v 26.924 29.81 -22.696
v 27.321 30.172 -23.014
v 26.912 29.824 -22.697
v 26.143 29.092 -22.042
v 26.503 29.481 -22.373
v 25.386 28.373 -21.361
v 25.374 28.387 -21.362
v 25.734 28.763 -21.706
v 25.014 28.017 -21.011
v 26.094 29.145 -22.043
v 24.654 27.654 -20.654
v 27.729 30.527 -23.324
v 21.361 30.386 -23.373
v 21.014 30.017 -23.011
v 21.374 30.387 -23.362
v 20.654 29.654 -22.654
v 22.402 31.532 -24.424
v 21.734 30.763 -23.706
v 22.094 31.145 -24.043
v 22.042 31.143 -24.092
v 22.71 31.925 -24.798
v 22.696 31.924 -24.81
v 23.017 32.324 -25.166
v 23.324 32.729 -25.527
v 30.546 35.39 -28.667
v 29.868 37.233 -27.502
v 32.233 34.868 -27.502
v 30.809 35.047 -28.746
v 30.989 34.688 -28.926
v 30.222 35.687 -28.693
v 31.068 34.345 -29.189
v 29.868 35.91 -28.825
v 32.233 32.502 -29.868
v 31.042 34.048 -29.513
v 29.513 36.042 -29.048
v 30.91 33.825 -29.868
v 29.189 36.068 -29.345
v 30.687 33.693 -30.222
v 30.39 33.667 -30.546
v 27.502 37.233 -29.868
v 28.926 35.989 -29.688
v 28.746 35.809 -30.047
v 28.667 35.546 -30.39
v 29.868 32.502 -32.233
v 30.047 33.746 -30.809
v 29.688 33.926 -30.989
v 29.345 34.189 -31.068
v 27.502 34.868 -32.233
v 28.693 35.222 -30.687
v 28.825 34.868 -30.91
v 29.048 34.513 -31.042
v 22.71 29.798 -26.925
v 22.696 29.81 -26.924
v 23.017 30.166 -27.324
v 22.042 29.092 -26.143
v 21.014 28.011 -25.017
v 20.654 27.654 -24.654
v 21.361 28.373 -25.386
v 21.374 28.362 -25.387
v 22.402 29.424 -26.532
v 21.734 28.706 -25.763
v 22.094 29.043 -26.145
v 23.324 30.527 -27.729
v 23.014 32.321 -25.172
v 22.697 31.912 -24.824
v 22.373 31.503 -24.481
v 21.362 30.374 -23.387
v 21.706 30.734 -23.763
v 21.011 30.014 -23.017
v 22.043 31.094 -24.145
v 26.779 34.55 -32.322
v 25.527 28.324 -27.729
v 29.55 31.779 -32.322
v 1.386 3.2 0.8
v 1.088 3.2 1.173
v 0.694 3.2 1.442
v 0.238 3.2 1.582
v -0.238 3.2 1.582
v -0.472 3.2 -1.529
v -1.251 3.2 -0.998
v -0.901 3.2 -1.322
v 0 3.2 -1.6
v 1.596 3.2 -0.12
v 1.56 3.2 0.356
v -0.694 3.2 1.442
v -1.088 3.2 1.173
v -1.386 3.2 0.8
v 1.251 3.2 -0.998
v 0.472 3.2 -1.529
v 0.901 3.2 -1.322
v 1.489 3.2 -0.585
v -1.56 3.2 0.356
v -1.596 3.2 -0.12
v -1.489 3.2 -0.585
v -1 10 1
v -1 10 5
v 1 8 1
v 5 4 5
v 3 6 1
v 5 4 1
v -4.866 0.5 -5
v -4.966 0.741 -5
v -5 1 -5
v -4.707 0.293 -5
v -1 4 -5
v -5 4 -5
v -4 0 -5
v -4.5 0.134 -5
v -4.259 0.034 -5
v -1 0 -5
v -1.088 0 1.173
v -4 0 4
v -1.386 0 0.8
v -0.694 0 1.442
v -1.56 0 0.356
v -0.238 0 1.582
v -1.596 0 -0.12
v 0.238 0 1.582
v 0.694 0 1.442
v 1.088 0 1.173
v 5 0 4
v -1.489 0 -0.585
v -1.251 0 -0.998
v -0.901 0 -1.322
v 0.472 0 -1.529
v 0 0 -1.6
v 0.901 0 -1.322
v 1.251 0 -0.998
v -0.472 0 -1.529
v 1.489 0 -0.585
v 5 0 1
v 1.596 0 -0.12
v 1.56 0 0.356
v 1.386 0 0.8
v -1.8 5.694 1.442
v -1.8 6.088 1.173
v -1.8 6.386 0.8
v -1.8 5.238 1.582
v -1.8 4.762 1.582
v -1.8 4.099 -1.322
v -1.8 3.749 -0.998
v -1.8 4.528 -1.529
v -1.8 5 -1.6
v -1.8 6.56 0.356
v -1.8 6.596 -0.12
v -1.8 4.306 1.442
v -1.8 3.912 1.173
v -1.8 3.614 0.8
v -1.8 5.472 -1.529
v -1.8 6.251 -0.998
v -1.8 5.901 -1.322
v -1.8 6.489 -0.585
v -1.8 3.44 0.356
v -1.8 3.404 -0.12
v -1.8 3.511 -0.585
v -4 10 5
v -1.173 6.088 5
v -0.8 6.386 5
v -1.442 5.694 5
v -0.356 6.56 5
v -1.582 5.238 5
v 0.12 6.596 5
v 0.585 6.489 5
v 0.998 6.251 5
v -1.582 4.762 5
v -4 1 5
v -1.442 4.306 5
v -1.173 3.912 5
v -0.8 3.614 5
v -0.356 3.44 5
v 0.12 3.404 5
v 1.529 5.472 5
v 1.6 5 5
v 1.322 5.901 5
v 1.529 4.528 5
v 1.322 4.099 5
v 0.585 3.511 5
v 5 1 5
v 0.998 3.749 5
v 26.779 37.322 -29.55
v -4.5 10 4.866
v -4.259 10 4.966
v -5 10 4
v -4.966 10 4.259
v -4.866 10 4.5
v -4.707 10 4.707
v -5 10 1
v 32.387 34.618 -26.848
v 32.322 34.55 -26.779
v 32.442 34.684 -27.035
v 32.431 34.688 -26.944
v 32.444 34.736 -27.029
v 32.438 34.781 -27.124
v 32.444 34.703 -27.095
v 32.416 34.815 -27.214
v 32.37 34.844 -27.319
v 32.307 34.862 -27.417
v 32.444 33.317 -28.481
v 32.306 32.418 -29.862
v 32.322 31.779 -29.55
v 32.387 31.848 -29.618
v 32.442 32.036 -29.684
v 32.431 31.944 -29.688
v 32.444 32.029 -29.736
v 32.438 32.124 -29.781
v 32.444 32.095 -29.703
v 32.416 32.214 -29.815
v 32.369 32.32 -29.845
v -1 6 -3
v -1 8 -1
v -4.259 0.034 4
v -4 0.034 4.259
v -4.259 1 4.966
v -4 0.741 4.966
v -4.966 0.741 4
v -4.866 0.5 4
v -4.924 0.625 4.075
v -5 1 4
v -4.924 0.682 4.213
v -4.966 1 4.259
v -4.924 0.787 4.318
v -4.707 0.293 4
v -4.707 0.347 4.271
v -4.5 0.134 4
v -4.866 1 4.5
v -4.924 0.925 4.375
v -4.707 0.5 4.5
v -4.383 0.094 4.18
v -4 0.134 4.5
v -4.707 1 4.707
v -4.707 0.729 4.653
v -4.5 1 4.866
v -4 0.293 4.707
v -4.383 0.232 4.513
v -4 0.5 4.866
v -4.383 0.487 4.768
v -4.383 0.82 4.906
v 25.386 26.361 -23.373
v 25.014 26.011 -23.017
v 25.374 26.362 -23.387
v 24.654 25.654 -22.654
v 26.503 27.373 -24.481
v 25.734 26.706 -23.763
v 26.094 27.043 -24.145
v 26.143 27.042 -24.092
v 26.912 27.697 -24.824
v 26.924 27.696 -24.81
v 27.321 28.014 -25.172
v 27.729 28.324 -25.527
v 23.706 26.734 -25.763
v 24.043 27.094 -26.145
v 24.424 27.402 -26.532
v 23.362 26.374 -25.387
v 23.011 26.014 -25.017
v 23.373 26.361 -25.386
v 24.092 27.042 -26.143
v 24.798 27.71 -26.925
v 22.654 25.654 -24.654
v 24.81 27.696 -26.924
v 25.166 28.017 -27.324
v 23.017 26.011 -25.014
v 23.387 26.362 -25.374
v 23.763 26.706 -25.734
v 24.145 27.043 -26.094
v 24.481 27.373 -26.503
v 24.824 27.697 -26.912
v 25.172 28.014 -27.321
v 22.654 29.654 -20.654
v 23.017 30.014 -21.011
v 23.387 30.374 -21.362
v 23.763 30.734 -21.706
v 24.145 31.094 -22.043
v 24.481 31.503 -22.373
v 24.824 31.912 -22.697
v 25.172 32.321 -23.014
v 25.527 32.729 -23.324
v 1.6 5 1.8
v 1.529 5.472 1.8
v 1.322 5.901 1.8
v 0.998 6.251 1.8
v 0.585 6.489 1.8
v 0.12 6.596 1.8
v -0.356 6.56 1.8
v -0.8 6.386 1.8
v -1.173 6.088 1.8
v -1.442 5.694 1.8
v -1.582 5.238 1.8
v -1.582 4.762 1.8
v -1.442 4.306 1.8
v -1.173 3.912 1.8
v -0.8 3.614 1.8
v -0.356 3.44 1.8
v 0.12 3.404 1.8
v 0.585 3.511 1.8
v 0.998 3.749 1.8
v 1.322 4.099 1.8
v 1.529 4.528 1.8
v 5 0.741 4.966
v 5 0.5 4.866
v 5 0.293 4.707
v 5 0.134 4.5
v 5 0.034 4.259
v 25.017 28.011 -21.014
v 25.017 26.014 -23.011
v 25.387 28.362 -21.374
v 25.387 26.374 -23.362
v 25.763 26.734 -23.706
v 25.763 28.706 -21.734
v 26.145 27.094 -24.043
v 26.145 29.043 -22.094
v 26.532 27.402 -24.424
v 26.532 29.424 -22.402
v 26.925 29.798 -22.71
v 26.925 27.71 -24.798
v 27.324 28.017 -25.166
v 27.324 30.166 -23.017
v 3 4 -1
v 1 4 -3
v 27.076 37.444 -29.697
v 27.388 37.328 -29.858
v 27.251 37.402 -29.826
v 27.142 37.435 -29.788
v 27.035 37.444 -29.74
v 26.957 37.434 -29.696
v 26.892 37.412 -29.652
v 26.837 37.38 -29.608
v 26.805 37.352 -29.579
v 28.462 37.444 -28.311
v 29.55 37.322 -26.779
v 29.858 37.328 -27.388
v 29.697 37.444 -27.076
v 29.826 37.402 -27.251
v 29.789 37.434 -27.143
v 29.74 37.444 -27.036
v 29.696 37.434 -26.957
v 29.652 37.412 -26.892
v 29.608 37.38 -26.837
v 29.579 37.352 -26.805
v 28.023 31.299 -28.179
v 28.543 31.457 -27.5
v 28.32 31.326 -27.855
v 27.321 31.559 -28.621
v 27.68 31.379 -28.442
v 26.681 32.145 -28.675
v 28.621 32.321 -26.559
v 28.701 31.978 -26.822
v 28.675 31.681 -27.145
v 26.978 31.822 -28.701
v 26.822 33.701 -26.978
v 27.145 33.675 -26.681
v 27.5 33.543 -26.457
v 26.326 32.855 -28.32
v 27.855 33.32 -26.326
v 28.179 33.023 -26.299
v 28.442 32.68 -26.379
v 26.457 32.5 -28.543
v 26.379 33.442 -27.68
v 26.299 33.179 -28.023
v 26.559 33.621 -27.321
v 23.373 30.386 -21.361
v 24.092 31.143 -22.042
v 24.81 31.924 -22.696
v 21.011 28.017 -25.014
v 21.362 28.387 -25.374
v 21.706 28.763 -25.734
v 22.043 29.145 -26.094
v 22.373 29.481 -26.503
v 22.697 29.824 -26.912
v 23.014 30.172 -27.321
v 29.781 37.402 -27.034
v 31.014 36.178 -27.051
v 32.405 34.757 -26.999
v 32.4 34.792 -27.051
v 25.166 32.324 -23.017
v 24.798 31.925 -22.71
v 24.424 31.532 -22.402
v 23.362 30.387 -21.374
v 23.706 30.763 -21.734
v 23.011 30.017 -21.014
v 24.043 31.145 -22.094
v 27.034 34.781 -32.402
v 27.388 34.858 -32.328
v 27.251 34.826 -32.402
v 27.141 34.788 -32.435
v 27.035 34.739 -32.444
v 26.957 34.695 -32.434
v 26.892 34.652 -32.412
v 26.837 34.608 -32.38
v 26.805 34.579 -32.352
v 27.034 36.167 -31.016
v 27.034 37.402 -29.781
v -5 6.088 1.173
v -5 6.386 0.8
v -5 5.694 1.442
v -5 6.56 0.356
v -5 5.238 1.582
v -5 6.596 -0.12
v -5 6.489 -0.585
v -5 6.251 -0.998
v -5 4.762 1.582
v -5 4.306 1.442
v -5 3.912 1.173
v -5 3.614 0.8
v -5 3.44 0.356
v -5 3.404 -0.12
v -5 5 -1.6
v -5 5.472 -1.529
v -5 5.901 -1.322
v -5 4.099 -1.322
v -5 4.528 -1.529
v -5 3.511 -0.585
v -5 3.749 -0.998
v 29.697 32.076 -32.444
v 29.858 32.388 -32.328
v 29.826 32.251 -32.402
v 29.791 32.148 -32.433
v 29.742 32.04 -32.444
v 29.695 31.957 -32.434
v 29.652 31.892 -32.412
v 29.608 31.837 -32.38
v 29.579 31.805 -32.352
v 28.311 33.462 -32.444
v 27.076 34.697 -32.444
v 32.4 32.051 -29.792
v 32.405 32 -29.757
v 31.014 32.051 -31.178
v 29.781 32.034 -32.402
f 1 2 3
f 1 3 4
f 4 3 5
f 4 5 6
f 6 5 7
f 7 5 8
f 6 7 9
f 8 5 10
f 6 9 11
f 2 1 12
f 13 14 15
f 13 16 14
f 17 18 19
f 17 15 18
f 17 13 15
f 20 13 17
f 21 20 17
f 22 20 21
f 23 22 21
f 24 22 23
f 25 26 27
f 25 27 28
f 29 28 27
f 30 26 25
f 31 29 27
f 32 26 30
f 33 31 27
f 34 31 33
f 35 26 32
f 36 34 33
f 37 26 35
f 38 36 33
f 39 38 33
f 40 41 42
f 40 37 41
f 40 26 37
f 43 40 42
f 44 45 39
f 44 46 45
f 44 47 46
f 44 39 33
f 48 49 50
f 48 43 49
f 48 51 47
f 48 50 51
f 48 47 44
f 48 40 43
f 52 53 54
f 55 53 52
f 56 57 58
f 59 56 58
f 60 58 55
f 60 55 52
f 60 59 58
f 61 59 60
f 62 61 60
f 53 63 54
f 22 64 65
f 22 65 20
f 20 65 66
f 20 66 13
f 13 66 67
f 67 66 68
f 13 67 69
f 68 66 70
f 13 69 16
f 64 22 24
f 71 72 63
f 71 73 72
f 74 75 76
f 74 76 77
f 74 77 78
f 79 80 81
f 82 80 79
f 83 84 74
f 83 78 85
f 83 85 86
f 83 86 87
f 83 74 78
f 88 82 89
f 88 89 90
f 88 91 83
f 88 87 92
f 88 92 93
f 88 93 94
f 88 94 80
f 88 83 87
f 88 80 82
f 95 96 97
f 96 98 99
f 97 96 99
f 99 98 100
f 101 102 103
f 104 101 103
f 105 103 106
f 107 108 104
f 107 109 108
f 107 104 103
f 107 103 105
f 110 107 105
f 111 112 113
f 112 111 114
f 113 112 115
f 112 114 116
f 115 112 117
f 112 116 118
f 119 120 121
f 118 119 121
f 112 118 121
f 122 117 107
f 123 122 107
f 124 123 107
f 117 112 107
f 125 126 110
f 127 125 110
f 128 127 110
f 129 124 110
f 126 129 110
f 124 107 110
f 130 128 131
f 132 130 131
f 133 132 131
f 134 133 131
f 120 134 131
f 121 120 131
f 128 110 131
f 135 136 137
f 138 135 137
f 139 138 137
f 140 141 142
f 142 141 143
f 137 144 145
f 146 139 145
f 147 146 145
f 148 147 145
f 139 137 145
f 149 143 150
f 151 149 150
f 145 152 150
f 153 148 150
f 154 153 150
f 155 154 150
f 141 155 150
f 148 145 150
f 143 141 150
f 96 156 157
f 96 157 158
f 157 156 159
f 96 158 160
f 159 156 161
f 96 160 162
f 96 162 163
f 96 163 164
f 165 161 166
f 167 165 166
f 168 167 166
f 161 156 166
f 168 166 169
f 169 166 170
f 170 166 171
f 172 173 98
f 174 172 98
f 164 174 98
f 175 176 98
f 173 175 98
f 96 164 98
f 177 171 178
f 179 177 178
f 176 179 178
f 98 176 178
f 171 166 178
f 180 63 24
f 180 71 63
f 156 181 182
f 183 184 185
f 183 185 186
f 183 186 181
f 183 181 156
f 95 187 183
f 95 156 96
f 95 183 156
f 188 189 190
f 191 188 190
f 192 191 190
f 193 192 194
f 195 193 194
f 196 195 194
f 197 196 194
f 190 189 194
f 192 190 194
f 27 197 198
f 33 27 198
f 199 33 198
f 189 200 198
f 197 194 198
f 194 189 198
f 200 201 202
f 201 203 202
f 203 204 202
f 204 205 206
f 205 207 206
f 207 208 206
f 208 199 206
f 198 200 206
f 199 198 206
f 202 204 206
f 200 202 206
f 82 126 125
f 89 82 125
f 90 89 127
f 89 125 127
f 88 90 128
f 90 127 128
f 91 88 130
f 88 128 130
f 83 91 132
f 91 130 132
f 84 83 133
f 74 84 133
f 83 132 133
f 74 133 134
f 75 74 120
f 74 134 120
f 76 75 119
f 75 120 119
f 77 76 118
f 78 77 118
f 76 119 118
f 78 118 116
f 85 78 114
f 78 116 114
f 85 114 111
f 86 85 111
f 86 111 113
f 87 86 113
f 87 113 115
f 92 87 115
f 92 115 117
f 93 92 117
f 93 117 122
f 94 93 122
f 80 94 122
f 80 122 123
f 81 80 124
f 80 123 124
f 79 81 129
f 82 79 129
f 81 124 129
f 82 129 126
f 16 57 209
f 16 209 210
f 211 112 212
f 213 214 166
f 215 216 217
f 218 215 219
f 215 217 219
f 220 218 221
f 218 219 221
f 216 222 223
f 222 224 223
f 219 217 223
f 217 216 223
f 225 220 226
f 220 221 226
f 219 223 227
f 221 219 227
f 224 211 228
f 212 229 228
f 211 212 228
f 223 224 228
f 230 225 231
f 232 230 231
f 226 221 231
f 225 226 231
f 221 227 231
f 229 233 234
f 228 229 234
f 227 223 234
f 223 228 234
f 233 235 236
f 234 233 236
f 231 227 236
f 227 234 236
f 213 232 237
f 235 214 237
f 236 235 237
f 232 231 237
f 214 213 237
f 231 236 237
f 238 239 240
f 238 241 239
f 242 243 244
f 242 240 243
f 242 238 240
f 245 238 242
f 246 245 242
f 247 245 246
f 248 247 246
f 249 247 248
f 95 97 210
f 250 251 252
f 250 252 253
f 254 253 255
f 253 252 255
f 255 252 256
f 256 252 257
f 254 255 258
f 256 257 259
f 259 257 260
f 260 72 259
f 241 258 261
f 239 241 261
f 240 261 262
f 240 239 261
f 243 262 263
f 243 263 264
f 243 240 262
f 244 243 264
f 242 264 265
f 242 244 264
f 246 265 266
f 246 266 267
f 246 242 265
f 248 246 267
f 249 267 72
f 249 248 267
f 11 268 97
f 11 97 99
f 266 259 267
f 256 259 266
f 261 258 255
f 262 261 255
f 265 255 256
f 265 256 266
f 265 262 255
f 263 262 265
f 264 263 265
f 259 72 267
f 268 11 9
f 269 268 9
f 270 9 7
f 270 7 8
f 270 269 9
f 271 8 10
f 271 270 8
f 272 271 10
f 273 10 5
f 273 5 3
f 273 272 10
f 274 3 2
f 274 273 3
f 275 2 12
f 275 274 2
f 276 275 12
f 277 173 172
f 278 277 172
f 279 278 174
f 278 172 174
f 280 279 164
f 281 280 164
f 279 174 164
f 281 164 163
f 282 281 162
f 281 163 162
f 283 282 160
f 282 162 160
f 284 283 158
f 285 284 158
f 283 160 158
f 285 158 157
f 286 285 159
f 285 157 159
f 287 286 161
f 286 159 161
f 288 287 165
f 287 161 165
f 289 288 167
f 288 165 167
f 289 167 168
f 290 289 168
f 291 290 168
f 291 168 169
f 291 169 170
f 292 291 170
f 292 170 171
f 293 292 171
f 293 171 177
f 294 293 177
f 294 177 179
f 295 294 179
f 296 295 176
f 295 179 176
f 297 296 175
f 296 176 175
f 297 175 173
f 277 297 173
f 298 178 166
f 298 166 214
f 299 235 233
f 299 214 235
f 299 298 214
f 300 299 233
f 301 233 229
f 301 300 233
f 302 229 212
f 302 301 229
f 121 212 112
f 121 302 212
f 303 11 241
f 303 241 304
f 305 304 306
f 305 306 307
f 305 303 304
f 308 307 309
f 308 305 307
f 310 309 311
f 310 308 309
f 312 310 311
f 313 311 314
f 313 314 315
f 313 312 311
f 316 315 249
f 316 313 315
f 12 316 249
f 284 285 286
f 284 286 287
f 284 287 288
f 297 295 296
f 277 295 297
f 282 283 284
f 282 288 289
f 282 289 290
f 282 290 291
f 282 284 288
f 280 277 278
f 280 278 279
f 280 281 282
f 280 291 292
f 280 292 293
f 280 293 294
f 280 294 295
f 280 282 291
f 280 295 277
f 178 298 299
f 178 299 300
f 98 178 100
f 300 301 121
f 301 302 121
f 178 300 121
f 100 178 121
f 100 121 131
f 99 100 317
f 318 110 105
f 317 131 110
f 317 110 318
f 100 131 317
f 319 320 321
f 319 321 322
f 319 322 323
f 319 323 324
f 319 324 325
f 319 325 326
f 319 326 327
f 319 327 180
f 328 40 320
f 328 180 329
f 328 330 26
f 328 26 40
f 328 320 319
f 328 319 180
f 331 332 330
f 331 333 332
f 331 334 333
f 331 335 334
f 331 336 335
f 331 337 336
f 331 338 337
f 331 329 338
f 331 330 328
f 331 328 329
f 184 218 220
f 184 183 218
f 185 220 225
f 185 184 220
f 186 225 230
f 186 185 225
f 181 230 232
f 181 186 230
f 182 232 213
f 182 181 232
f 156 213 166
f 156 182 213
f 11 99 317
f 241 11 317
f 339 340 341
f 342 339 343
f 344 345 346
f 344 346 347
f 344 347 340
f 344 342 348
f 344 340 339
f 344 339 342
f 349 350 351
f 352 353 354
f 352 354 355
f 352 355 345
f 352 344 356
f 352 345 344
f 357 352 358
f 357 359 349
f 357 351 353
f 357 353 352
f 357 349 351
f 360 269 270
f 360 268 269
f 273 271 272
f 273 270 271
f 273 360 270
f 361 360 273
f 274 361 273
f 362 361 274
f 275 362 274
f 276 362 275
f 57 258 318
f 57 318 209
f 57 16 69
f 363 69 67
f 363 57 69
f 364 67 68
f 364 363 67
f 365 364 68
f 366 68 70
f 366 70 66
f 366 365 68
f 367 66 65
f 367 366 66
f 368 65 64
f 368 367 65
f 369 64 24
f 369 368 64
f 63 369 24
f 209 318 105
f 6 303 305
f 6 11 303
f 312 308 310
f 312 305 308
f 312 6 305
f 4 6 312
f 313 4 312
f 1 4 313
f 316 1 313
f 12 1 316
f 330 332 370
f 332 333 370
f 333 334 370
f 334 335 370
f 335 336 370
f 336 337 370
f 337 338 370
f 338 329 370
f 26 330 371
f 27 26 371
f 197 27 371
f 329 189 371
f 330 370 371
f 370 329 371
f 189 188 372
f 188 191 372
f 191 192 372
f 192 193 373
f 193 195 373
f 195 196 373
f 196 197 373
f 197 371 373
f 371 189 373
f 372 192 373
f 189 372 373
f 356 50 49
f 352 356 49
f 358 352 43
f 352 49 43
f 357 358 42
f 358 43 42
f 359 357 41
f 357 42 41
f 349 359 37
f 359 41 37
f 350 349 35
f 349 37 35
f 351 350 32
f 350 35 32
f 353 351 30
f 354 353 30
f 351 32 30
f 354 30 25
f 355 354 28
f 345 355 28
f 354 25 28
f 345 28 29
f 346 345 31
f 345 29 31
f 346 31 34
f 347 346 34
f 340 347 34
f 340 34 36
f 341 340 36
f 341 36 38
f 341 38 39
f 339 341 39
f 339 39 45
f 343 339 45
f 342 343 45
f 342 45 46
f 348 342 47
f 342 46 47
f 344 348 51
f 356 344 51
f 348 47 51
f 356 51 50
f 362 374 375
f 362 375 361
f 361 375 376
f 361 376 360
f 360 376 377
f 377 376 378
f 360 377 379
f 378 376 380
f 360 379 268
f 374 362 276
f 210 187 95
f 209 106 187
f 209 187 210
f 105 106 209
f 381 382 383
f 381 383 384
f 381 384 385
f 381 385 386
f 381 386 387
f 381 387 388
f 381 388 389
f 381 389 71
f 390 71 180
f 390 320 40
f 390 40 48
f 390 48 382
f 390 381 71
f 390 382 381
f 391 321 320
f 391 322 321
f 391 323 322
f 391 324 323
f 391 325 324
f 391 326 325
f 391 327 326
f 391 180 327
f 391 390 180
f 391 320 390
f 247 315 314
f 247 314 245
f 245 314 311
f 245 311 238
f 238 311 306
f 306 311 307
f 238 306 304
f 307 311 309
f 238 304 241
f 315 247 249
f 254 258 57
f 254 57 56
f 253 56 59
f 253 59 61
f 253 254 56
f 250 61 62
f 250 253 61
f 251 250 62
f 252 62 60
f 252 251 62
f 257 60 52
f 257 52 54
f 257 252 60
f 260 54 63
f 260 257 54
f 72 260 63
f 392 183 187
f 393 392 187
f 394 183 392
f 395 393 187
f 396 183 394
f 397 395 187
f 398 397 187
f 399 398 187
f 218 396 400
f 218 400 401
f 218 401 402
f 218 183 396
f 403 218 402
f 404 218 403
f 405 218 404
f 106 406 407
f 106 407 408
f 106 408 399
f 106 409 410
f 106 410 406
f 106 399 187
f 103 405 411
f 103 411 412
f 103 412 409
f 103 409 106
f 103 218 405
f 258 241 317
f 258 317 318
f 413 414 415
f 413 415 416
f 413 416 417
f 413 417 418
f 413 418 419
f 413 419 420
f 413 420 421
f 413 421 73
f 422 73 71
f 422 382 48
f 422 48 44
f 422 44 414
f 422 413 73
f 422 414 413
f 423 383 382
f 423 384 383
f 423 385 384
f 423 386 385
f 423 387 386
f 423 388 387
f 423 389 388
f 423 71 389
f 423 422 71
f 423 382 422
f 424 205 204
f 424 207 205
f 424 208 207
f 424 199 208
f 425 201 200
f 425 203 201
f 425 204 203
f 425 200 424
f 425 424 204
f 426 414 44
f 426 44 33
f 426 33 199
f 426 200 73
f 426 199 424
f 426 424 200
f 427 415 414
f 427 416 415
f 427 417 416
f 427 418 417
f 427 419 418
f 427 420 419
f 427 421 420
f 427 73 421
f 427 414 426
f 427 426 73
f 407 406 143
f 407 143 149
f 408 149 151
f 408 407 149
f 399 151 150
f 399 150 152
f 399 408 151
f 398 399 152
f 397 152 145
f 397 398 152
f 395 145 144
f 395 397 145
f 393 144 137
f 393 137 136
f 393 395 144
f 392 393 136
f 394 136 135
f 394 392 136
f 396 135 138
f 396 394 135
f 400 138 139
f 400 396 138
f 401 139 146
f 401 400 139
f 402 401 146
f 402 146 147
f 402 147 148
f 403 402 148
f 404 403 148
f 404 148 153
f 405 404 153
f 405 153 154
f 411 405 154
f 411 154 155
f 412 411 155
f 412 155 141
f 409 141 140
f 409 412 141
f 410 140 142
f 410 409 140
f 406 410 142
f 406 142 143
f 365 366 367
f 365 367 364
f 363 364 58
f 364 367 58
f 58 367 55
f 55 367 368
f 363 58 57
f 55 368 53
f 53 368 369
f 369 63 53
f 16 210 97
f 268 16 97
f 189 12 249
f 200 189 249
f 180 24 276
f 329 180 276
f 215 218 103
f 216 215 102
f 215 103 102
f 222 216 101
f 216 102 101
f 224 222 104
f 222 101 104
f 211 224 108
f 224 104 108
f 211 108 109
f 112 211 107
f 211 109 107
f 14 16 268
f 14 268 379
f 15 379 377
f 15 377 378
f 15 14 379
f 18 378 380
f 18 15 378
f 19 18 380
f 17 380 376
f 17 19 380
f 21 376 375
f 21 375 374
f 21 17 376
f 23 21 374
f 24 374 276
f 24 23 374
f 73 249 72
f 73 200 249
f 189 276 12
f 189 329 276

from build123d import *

# Parameters (mm, degrees)
SKETCH1_W           = 10
SKETCH1_H           = 10
BOSS_EXTRUDE1_DEPTH = 10
SKETCH2_R           = 1.6
CUT_EXTRUDE1_DEPTH  = 3.2
SKETCH3_R           = 1.6
CUT_EXTRUDE3_DEPTH  = 3.2
SKETCH4_R           = 1.6
CUT_EXTRUDE4_DEPTH  = 3.2
FILLET2_R           = 1
CHAMFER1_SIZE       = 6
BOSS_EXTRUDE2_DEPTH = 50
SKETCH6_R           = 1.475
CUT_EXTRUDE5_DEPTH  = 4.1
FILLET3_R           = 0.5
FILLET4_R           = 50


with BuildPart() as part:
    # Sketch1 → Boss-Extrude1 (new body)
    with BuildSketch(Plane(origin=(0, 0, 0), x_dir=(1, 0, 0), z_dir=(0, 1, 0))):
        Rectangle(SKETCH1_W, SKETCH1_H)
    extrude(amount=BOSS_EXTRUDE1_DEPTH)

    # Sketch2 → Cut-Extrude1 (cut)
    with BuildSketch(Plane.XY.offset(5)):
        with Locations((0, 5)):
            Circle(SKETCH2_R)
    extrude(amount=-CUT_EXTRUDE1_DEPTH, mode=Mode.SUBTRACT)

    # Sketch3 → Cut-Extrude3 (cut)
    with BuildSketch(Plane(origin=(0, 0, 0), x_dir=(-1, 0, 0), z_dir=(0, -1, 0))):
        with Locations(Location((0, 0, 0), (0, 0, 90))):
            Circle(SKETCH3_R)
    extrude(amount=-CUT_EXTRUDE3_DEPTH, mode=Mode.SUBTRACT)

    # Sketch4 → Cut-Extrude4 (cut)
    with BuildSketch(Plane(origin=(-5, 0, 0), x_dir=(0, 0, -1), z_dir=(1, 0, 0))):
        with Locations((0, 5)):
            Circle(SKETCH4_R)
    extrude(amount=CUT_EXTRUDE4_DEPTH, mode=Mode.SUBTRACT)

    # Fillet2
    fillet2_edges = [part.edges().sort_by_distance(p)[0] for p in [
        (0, 0, 5),
        (-5, 0, 0),
        (-5, 5, 5),
    ]]
    fillet(fillet2_edges, radius=FILLET2_R)

    # Chamfer1
    chamfer1_edges = [part.edges().sort_by_distance(p)[0] for p in [
        (5, 10, 0),
        (5, 5, -5),
        (0, 10, -5),
    ]]
    chamfer(chamfer1_edges, length=CHAMFER1_SIZE)

    # Sketch5 → Boss-Extrude2 (add)
    with BuildSketch(Plane(origin=(2.666666667, 2.666666667, -2.666666667), x_dir=(-0.4082482904638649, -0.4082482904638639, -0.8164965809277248), z_dir=(0.5773502691896257, 0.577350269189624, -0.5773502691896276))):
        Polygon((0.40824829, 4.949747468), (-2.041241452, 6.363961031), (-4.490731195, 4.949747468), (-4.490731195, 2.121320344), (-2.041241452, 0.707106781), (0.40824829, 2.121320344), align=None)
    extrude(amount=BOSS_EXTRUDE2_DEPTH)

    # Sketch13 → Loft3 section 0
    with BuildSketch(Plane(origin=(25.760677434, 25.760677434, -25.760677434), x_dir=(-0.8164965809277259, 0.4082482904638619, -0.4082482904638644), z_dir=(0.577350269189626, 0.577350269189624, -0.5773502691896274))):
        with BuildLine():
            Line((2.041241452, 6.363961031), (-0.40824829, 4.949747468))
            Line((-0.40824829, 4.949747468), (-0.40824829, 2.121320344))
            Line((-0.40824829, 2.121320344), (2.041241452, 0.707106781))
            Line((2.041241452, 0.707106781), (4.490731195, 2.121320344))
            Line((4.490731195, 2.121320344), (4.490731195, 4.949747468))
            Line((4.490731195, 4.949747468), (2.041241452, 6.363961031))
        make_face()
    # Sketch12 → Loft3 section 1
    with BuildSketch(Plane(origin=(31.534180126, 31.534180126, -31.534180126), x_dir=(-0.40824829046386485, -0.4082482904638636, -0.8164965809277249), z_dir=(0.577350269189626, 0.5773502691896241, -0.5773502691896275))):
        with BuildLine():
            Line((1.40824829, 1.543970074), (1.40824829, 5.527097737))
            Line((1.40824829, 5.527097737), (-2.041241452, 7.518661569))
            Line((-2.041241452, 7.518661569), (-5.490731195, 5.527097737))
            Line((-5.490731195, 5.527097737), (-5.490731195, 1.543970074))
            Line((-5.490731195, 1.543970074), (-2.041241452, -0.447593757))
            Line((-2.041241452, -0.447593757), (1.40824829, 1.543970074))
        make_face()
    loft()

    # Sketch6 → Cut-Extrude5 (cut)
    with BuildSketch(Plane(origin=(31.534180126, 31.534180126, -31.534180126), x_dir=(-0.40824829046386507, -0.4082482904638639, -0.8164965809277246), z_dir=(0.5773502691896257, 0.5773502691896238, -0.5773502691896278))):
        with Locations(Location((-2.041241452, 3.535533906, 0), (0, 0, 30))):
            Circle(SKETCH6_R)
    extrude(amount=-CUT_EXTRUDE5_DEPTH, mode=Mode.SUBTRACT)

    # Fillet3
    fillet3_edges = [part.edges().sort_by_distance(p)[0] for p in [
        (28.459265169, 37.68401004, -28.459265169),
        (31.27576175, 36.27576175, -27.051016879),
        (32.68401004, 33.459265169, -28.459265169),
        (31.27576175, 32.051016879, -31.27576175),
        (28.459265169, 33.459265169, -32.68401004),
        (27.051016879, 36.27576175, -31.27576175),
    ]]
    fillet(fillet3_edges, radius=FILLET3_R)

    # Fillet4
    # the kernel refuses this fillet: 50 mm, written as the material it adds along each edge
    with BuildSketch(Plane(origin=(30.502434506, 27.094010768, -19.685587029), x_dir=(0.6151072128065446, 0.49324054325118827, -0.6151072128065457), z_dir=(-0.7071067811865475, -1.8318679906315083e-15, -0.7071067811865477))) as fillet4_piece_1_section:
        with BuildLine():
            CenterArc((FILLET4_R * 0.0498756211209, FILLET4_R), FILLET4_R, 264.289406863, 5.710593137)
            Line((-FILLET4_R * 0.0496280979001, FILLET4_R * 0.00496280979001), (0, 0))
            Line((0, 0), (FILLET4_R * 0.0498756211209, 0))
        make_face()
    fillet4_piece_1 = extrude(amount=15.297332405, mode=Mode.PRIVATE)
    fillet4_piece_1 = fillet4_piece_1 - Plane(origin=(5.44602295, 2.037599211, -65.47905465), x_dir=(0.4636707308133369, 0.463670730813339, 0.7549959647402431), z_dir=(0.7071067811865475, -0.7071067811865478, 2.220446049250313e-15)) * Cylinder(50, 41, mode=Mode.PRIVATE)
    fillet4_piece_1 = fillet4_piece_1 - Plane(origin=(65.47905465, 7.44602295, -0.037599211), x_dir=(-0.7549959647402456, 0.4636707308133344, -0.46367073081333715), z_dir=(0, 0.7071067811865497, 0.7071067811865455)) * Cylinder(50, 41, mode=Mode.PRIVATE)
    add(fillet4_piece_1)
    with BuildSketch(Plane(origin=(26.094010768, 33.502434506, -17.685587029), x_dir=(0.6557294359916664, 0.5338627664363041, -0.5338627664363074), z_dir=(0, -0.7071067811865497, -0.7071067811865455))) as fillet4_piece_2_section:
        with BuildLine():
            CenterArc((FILLET4_R * 0.0498756211209, FILLET4_R), FILLET4_R, 264.289406863, 5.710593137)
            Line((-FILLET4_R * 0.0496280979001, FILLET4_R * 0.00496280979001), (0, 0))
            Line((0, 0), (FILLET4_R * 0.0498756211209, 0))
        make_face()
    fillet4_piece_2 = extrude(amount=15.297332405, mode=Mode.PRIVATE)
    fillet4_piece_2 = fillet4_piece_2 - Plane(origin=(42.862428257, 50.270851996, 20.170603443), x_dir=(-0.3487737328890522, -0.34877373288905417, -0.8698929626645284), z_dir=(-0.7071067811865471, 0.7071067811865479, -1.8596235662471372e-15)) * Cylinder(50, 41, mode=Mode.PRIVATE)
    fillet4_piece_2 = fillet4_piece_2 - Plane(origin=(48.270851996, -15.170603443, -39.862428257), x_dir=(-0.34877373288905117, 0.8698929626645311, 0.3487737328890489), z_dir=(0.7071067811865476, 1.831867990631508e-15, 0.7071067811865476)) * Cylinder(50, 41, mode=Mode.PRIVATE)
    add(fillet4_piece_2)
    with BuildSketch(Plane(origin=(19.685587029, 35.502434506, -22.094010768), x_dir=(0.6151072128065466, 0.6151072128065448, -0.49324054325118677), z_dir=(0.7071067811865472, -0.7071067811865479, 1.7763568394002505e-15))) as fillet4_piece_3_section:
        with BuildLine():
            CenterArc((FILLET4_R * 0.0498756211209, FILLET4_R), FILLET4_R, 264.289406863, 5.710593137)
            Line((-FILLET4_R * 0.0496280979001, FILLET4_R * 0.00496280979001), (0, 0))
            Line((0, 0), (FILLET4_R * 0.0498756211209, 0))
        make_face()
    fillet4_piece_3 = extrude(amount=15.297332405, mode=Mode.PRIVATE)
    fillet4_piece_3 = fillet4_piece_3 - Plane(origin=(0.037599211, 70.47905465, -2.44602295), x_dir=(0.46367073081333604, -0.7549959647402467, -0.4636707308133341), z_dir=(-0.7071067811865476, -1.6930901125533633e-15, -0.7071067811865477)) * Cylinder(50, 41, mode=Mode.PRIVATE)
    fillet4_piece_3 = fillet4_piece_3 - Plane(origin=(65.47905465, 10.44602295, 2.962400789), x_dir=(-0.7549959647402456, 0.4636707308133344, -0.46367073081333715), z_dir=(0, 0.7071067811865497, 0.7071067811865455)) * Cylinder(50, 41, mode=Mode.PRIVATE)
    add(fillet4_piece_3)
    with BuildSketch(Plane(origin=(17.685587029, 31.094010768, -28.502434506), x_dir=(0.533862766436308, 0.6557294359916612, -0.5338627664363096), z_dir=(0.7071067811865475, 1.7763568394002505e-15, 0.7071067811865476))) as fillet4_piece_4_section:
        with BuildLine():
            CenterArc((FILLET4_R * 0.0498756211209, FILLET4_R), FILLET4_R, 264.289406863, 5.710593137)
            Line((-FILLET4_R * 0.0496280979001, FILLET4_R * 0.00496280979001), (0, 0))
            Line((0, 0), (FILLET4_R * 0.0498756211209, 0))
        make_face()
    fillet4_piece_4 = extrude(amount=15.297332405, mode=Mode.PRIVATE)
    fillet4_piece_4 = fillet4_piece_4 - Plane(origin=(39.862428257, 53.270851996, 20.170603443), x_dir=(-0.3487737328890522, -0.34877373288905417, -0.8698929626645284), z_dir=(-0.7071067811865471, 0.7071067811865479, -1.8596235662471372e-15)) * Cylinder(50, 41, mode=Mode.PRIVATE)
    fillet4_piece_4 = fillet4_piece_4 - Plane(origin=(-20.170603443, 47.862428257, -45.270851996), x_dir=(0.8698929626645304, -0.34877373288904956, 0.3487737328890521), z_dir=(0, -0.7071067811865497, -0.7071067811865454)) * Cylinder(50, 41, mode=Mode.PRIVATE)
    add(fillet4_piece_4)
    with BuildSketch(Plane(origin=(28.502434506, 22.685587029, -26.094010768), x_dir=(0.5338627664363049, 0.5338627664363026, -0.6557294359916698), z_dir=(-0.7071067811865474, 0.7071067811865477, -2.220446049250313e-15))) as fillet4_piece_5_section:
        with BuildLine():
            CenterArc((FILLET4_R * 0.0498756211209, FILLET4_R), FILLET4_R, 264.289406863, 5.710593137)
            Line((-FILLET4_R * 0.0496280979001, FILLET4_R * 0.00496280979001), (0, 0))
            Line((0, 0), (FILLET4_R * 0.0498756211209, 0))
        make_face()
    fillet4_piece_5 = extrude(amount=15.297332405, mode=Mode.PRIVATE)
    fillet4_piece_5 = fillet4_piece_5 - Plane(origin=(45.270851996, -15.170603443, -42.862428257), x_dir=(-0.34877373288905117, 0.8698929626645311, 0.3487737328890489), z_dir=(0.7071067811865476, 1.831867990631508e-15, 0.7071067811865476)) * Cylinder(50, 41, mode=Mode.PRIVATE)
    fillet4_piece_5 = fillet4_piece_5 - Plane(origin=(-20.170603443, 44.862428257, -48.270851996), x_dir=(0.8698929626645304, -0.34877373288904956, 0.3487737328890521), z_dir=(0, -0.7071067811865497, -0.7071067811865454)) * Cylinder(50, 41, mode=Mode.PRIVATE)
    add(fillet4_piece_5)
    with BuildSketch(Plane(origin=(22.094010768, 24.685587029, -30.502434506), x_dir=(0.49324054325118744, 0.6151072128065436, -0.6151072128065473), z_dir=(0, 0.7071067811865498, 0.7071067811865454))) as fillet4_piece_6_section:
        with BuildLine():
            CenterArc((FILLET4_R * 0.0498756211209, FILLET4_R), FILLET4_R, 264.289406863, 5.710593137)
            Line((-FILLET4_R * 0.0496280979001, FILLET4_R * 0.00496280979001), (0, 0))
            Line((0, 0), (FILLET4_R * 0.0498756211209, 0))
        make_face()
    fillet4_piece_6 = extrude(amount=15.297332405, mode=Mode.PRIVATE)
    fillet4_piece_6 = fillet4_piece_6 - Plane(origin=(2.44602295, 5.037599211, -65.47905465), x_dir=(0.4636707308133369, 0.463670730813339, 0.7549959647402431), z_dir=(0.7071067811865475, -0.7071067811865478, 2.220446049250313e-15)) * Cylinder(50, 41, mode=Mode.PRIVATE)
    fillet4_piece_6 = fillet4_piece_6 - Plane(origin=(-2.962400789, 70.47905465, -5.44602295), x_dir=(0.46367073081333604, -0.7549959647402467, -0.4636707308133341), z_dir=(-0.7071067811865476, -1.6930901125533633e-15, -0.7071067811865477)) * Cylinder(50, 41, mode=Mode.PRIVATE)
    add(fillet4_piece_6)


solid = part.part
